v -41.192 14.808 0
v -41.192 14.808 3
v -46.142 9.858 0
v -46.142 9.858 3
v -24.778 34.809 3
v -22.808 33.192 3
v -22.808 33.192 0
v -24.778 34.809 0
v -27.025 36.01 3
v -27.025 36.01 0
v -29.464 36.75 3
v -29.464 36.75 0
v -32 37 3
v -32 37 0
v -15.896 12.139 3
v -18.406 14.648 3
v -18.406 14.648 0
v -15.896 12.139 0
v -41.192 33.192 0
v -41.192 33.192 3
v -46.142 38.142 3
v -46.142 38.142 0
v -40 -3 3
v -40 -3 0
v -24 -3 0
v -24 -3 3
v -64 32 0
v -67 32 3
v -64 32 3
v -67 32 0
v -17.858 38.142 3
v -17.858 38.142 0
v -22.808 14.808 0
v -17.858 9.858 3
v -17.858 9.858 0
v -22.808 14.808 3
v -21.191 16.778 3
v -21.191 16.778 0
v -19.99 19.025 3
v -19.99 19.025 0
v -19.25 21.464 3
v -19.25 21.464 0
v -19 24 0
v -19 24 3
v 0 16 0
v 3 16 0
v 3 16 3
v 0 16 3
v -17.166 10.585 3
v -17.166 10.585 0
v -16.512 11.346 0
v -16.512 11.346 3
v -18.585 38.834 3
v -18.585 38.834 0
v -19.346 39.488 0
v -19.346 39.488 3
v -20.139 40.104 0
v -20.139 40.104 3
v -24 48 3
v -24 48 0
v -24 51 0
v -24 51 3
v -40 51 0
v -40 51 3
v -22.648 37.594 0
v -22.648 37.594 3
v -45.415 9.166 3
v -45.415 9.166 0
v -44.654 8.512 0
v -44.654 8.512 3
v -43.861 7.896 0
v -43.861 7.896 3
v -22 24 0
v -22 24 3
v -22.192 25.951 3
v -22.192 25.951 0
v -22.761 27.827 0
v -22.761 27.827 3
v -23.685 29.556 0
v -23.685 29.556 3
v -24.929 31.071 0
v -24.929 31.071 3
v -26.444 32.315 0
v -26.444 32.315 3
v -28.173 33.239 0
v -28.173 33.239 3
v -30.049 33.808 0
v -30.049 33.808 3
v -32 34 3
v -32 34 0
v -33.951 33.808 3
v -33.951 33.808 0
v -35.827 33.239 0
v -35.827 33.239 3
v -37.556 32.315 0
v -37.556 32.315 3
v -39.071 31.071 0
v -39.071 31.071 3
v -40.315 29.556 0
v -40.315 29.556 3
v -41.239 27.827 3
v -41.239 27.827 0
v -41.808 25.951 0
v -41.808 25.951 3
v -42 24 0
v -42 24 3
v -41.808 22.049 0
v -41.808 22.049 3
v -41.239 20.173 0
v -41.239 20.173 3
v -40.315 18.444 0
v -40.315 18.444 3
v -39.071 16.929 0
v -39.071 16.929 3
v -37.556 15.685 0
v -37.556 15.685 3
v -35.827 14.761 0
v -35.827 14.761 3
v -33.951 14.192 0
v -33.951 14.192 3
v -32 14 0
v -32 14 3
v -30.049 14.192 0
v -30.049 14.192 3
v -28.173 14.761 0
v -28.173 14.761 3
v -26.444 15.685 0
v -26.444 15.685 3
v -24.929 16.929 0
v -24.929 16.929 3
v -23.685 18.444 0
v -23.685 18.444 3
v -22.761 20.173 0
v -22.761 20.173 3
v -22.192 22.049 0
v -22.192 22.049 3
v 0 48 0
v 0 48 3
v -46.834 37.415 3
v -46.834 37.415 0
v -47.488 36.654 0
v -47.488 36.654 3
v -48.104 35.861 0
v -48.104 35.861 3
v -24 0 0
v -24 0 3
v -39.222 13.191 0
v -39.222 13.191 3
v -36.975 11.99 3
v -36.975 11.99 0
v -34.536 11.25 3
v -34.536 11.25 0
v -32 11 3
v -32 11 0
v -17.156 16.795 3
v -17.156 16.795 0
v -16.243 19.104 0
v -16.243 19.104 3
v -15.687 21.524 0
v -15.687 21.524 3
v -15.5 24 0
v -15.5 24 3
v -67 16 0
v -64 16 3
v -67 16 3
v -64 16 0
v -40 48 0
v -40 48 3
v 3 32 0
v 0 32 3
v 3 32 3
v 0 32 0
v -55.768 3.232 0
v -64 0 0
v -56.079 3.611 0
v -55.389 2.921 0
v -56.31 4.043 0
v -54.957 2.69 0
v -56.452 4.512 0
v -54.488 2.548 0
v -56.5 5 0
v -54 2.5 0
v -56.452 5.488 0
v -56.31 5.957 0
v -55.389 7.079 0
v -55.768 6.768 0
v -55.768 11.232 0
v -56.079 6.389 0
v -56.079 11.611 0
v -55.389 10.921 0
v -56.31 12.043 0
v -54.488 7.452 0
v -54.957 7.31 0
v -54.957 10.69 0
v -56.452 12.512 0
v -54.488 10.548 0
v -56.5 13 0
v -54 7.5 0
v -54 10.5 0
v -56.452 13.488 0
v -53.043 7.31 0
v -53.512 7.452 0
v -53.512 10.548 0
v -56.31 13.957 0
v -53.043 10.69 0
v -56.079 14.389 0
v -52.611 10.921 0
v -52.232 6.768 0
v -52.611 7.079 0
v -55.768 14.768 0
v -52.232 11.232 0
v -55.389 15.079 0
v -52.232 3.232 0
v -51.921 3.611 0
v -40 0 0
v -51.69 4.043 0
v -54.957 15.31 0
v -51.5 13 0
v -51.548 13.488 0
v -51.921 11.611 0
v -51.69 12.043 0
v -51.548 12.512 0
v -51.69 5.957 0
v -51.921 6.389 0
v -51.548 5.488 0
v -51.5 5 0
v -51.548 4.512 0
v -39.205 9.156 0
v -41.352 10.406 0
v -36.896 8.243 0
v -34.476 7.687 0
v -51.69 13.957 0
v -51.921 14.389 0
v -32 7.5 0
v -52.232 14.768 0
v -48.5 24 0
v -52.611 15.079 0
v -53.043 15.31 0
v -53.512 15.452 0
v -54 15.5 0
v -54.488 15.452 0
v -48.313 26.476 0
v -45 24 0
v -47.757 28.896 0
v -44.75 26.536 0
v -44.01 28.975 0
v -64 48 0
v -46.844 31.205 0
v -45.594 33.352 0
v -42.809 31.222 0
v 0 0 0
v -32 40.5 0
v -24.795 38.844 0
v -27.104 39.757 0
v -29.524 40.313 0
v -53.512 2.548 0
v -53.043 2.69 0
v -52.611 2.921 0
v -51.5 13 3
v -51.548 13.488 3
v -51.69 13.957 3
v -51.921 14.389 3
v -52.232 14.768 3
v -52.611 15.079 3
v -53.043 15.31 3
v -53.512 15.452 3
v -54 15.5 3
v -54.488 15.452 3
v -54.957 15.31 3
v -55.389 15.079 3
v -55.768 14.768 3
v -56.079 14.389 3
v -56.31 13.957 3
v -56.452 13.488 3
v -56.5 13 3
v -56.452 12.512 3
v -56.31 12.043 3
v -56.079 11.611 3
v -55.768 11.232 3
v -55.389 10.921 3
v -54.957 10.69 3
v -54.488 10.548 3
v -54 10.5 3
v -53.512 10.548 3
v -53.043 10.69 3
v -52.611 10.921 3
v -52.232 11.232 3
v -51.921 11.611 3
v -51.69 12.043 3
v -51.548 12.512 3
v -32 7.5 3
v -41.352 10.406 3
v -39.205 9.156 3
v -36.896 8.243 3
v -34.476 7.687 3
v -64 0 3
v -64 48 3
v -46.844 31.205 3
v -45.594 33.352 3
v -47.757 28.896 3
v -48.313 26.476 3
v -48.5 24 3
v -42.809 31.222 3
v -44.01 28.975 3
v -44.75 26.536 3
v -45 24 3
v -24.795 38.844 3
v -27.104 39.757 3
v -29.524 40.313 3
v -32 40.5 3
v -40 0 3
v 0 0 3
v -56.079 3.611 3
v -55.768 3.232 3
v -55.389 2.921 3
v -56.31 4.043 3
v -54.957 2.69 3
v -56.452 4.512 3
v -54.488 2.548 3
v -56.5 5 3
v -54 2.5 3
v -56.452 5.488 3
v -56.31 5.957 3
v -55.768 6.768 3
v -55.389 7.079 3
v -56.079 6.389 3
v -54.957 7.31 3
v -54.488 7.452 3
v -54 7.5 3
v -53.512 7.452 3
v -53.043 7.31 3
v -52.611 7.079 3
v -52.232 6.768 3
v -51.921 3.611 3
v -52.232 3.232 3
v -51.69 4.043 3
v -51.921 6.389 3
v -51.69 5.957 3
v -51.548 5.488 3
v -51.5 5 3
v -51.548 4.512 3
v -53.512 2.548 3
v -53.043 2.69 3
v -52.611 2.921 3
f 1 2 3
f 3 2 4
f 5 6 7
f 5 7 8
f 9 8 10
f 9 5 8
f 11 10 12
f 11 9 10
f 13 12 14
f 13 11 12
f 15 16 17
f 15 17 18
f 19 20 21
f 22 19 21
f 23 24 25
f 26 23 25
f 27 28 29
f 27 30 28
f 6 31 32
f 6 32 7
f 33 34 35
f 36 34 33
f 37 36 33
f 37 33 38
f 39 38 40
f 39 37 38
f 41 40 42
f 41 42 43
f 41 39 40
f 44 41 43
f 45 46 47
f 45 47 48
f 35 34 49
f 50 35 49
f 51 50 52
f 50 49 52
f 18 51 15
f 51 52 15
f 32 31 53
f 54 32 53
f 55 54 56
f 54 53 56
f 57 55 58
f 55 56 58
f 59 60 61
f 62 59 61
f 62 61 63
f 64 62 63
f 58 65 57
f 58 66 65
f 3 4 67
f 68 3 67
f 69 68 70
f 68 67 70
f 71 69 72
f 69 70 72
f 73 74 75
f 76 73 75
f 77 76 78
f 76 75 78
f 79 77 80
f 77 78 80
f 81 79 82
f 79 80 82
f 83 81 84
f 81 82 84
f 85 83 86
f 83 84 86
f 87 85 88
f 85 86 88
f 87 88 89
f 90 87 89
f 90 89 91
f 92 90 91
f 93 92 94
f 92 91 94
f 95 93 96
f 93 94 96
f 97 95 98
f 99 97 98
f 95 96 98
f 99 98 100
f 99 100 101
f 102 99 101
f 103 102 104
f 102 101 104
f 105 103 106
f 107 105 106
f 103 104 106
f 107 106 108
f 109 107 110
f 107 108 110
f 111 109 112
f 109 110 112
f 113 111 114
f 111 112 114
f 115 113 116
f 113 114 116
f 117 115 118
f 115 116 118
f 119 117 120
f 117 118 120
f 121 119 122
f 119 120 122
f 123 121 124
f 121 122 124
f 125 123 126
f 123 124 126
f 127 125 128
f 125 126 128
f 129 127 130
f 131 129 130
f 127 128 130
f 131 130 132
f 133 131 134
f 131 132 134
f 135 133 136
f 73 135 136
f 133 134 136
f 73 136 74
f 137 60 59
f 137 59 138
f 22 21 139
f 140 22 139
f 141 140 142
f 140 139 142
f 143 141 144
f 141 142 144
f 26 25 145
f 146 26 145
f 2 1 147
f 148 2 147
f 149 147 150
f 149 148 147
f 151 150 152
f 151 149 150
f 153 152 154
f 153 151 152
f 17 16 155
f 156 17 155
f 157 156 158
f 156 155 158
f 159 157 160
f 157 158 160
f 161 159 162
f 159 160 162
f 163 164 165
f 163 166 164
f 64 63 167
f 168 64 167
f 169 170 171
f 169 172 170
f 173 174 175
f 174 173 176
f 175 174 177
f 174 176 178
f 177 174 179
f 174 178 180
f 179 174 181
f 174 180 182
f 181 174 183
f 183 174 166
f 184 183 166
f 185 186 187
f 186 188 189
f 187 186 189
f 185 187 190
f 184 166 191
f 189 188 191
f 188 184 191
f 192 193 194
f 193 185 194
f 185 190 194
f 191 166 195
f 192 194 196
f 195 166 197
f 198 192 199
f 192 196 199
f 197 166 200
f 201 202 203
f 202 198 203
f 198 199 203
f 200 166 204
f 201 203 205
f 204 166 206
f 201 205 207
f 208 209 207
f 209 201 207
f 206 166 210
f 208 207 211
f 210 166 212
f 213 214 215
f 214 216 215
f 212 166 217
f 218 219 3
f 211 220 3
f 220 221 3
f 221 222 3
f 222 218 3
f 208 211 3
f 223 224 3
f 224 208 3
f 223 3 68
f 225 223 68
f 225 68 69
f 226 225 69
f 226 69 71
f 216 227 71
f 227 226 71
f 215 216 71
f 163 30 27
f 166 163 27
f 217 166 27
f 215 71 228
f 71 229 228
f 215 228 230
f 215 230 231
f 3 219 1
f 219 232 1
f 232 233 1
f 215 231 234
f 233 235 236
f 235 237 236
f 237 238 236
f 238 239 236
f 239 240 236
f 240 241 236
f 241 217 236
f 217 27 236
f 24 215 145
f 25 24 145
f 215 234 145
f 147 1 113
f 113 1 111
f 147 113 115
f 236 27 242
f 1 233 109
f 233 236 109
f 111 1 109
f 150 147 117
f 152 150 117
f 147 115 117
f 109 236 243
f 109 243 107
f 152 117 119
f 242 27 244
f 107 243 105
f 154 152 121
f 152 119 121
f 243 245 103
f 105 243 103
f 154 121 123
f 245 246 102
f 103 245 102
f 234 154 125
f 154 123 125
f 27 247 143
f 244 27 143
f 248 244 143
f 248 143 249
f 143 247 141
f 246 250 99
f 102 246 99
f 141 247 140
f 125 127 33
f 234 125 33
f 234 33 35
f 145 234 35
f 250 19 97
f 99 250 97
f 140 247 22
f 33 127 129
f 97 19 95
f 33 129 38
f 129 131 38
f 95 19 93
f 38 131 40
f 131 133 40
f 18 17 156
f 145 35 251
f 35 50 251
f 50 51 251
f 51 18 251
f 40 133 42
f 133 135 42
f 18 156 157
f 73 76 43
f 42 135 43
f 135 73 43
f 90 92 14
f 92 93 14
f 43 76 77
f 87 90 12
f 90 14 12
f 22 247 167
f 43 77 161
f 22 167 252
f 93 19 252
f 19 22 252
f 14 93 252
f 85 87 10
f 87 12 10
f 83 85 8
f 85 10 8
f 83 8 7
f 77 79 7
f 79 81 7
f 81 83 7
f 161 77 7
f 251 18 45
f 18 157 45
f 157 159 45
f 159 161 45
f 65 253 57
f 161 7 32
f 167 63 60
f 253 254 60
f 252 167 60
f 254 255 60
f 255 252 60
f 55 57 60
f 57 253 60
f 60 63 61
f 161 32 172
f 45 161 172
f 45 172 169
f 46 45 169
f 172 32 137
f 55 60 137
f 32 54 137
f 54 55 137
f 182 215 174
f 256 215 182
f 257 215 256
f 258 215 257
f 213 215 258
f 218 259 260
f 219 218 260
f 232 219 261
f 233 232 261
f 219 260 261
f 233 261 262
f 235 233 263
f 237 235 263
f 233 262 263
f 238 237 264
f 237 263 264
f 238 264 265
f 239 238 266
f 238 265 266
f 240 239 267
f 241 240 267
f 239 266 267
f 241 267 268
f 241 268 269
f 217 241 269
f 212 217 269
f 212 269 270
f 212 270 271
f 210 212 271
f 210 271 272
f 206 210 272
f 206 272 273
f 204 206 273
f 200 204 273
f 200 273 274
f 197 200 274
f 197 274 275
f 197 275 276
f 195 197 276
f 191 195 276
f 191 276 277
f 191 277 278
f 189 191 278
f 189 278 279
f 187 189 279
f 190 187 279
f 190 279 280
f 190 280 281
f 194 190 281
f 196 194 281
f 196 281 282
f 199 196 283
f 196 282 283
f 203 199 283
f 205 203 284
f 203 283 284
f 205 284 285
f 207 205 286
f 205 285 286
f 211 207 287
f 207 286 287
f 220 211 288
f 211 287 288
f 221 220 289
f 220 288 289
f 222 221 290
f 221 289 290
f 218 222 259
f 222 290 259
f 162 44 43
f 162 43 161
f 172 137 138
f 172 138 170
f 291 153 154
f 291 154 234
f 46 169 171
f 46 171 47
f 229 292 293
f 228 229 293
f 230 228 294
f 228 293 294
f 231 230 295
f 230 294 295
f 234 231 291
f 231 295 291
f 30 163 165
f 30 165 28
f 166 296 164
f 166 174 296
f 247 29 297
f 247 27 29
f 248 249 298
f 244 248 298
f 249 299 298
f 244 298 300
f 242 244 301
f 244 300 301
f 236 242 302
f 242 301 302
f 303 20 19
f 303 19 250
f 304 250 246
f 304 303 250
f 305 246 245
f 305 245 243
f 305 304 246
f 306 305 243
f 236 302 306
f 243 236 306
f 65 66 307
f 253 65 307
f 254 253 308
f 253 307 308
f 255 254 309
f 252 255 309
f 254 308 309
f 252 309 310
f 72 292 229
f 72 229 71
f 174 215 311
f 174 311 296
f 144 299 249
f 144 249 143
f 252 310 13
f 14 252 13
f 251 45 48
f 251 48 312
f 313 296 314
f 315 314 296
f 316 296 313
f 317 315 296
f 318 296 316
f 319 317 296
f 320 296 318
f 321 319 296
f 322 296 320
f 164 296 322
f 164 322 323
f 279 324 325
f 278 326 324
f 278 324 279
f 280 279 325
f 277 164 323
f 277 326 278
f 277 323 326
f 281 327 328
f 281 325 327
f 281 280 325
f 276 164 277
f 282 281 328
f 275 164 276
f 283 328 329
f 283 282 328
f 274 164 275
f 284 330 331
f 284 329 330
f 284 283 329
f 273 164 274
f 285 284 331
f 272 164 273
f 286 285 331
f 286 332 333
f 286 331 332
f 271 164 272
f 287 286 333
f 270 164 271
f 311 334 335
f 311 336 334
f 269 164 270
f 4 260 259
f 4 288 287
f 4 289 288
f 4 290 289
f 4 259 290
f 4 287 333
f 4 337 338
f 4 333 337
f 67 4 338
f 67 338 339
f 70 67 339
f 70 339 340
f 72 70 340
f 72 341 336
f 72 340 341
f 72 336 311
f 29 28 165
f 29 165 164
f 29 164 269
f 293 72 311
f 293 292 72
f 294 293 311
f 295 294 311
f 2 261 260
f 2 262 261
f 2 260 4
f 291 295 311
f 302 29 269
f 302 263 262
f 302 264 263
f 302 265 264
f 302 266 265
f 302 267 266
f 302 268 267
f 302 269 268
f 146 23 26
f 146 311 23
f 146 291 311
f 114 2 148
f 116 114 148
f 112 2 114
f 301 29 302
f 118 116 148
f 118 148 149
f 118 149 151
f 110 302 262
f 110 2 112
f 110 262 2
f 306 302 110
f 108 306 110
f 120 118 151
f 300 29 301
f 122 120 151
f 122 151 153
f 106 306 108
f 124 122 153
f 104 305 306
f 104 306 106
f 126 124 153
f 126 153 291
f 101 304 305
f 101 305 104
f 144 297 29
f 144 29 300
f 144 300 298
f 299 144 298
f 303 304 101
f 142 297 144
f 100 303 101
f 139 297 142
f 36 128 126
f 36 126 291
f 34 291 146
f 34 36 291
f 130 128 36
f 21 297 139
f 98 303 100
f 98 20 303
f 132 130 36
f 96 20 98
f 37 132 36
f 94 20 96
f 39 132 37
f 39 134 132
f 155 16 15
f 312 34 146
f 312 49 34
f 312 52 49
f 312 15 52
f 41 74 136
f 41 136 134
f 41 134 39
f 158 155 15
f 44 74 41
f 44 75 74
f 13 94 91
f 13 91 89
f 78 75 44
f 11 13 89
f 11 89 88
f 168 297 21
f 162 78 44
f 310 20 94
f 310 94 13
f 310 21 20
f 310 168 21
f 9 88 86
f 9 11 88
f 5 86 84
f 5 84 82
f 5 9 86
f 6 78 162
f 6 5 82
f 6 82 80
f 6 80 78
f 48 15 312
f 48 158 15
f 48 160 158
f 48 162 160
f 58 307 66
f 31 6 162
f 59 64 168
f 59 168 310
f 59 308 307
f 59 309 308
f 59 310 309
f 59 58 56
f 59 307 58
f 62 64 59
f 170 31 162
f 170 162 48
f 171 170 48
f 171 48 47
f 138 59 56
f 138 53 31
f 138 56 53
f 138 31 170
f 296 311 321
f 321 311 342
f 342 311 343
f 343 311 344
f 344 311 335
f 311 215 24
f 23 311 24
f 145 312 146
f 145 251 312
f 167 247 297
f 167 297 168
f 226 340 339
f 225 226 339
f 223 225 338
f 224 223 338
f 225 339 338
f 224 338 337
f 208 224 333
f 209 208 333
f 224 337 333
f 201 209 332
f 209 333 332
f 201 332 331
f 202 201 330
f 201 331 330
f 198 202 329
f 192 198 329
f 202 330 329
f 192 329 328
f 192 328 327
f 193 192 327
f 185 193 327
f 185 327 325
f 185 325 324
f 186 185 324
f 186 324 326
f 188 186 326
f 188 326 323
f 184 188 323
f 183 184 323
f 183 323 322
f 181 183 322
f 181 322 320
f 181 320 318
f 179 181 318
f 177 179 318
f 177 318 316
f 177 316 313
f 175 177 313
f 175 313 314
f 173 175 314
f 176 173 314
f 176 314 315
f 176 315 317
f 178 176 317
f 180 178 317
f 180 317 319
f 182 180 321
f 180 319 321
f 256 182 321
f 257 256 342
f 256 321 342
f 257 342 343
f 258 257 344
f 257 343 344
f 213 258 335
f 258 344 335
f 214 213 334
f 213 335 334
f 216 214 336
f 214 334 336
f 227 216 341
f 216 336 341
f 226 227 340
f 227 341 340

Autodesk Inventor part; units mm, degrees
ref_plane "YZ Plane" through (0, 0, 0) normal (1, 0, 0) x (0, 1, 0)
ref_plane "XZ Plane" through (0, 0, 0) normal (0, 1, 0) x (-1, 0, 0)
ref_plane "XY Plane" through (0, 0, 0) normal (0, 0, 1) x (1, 0, 0)
sketch "Sketch1" plane through (0, 0, 0) normal (0, 0, 1) x (1, 0, 0)
  line L0 (-24, 48) -> (-24, 51)
  line L1 (-24, 51) -> (-40, 51)
  line L2 (-40, 51) -> (-40, 48)
  line L3 (0, 32) -> (3, 32)
  line L4 (3, 32) -> (3, 16)
  line L5 (3, 16) -> (0, 16)
  line L6 (-40, 0) -> (-40, -3)
  line L7 (-40, -3) -> (-24, -3)
  line L8 (-24, -3) -> (-24, 0)
  line L9 (-64, 16) -> (-67, 16)
  line L10 (-67, 16) -> (-67, 32)
  line L11 (-67, 32) -> (-64, 32)
  line L12 (-64, 48) -> (-40, 48)
  line L13 (-24, 48) -> (0, 48)
  line L14 (-64, 0) -> (-64, 16)
  line L15 (-64, 32) -> (-64, 48)
  line L16 (0, 0) -> (-24, 0)
  line L17 (-40, 0) -> (-64, 0)
  line L18 (0, 48) -> (0, 32)
  line L19 (0, 16) -> (0, 0)
  point P0 (0, 0)
  dimension "d3" = 16
  dimension "d4" = 16
  dimension "d8" = 64
  dimension "d9" = 48
  dimension "d10" = 3
  dimension "d11" = 3
  dimension "d12" = 24
  dimension "d13" = 24
  dimension "d14" = 16
  dimension "d15" = 3
extrude "Plate1" add sketch "Sketch1" along normal blind 3
sketch "Sketch2" plane through (0, 0, 3) normal (0, 0, 1) x (1, 0, 0)
  circle A0 centre (-32, 24) radius 10
  line L0 (-67, 32) -> (-67, 16) projected
  line L1 (-40, 51) -> (-24, 51) projected
  line L2 (0, 0) -> (0, 16) projected
  circle A1 centre (-32, 24) radius 16.5
  circle A2 centre (-32, 24) radius 20
  line L3 (0, 0) -> (-24, 0) projected
  line L4 (-64, 32) -> (-64, 48) projected
  line L5 (0, 48) -> (0, 32) projected
  line L6 (-64, 48) -> (-40, 48) projected
  line L7 (-64, 0) -> (-40, 0) projected
  line L8 (-52, 24) -> (-12, 24)
  line L9 (-32, 44) -> (-32, 4)
  line L10 (-17.8579, 38.1421) -> (-46.1421, 9.8579)
  line L11 (-17.8579, 9.8579) -> (-46.1421, 38.1421)
  line L12 (-22.6485, 37.5941) -> (-20.1392, 40.1035)
  line L13 (-18.4059, 14.6485) -> (-15.8965, 12.1392)
  line L14 (-41.3515, 10.4059) -> (-43.8608, 7.8965)
  line L15 (-45.5941, 33.3515) -> (-48.1035, 35.8608)
  circle A3 centre (-32, 24) radius 13
  circle A4 centre (-54, 5) radius 2.5
  circle A5 centre (-54, 13) radius 2.5
  line L16 (-64, 0) -> (-64, 16) projected
  point P0 (-32, 24)
  point P1 (-17.1512, 13.3939)
  point P2 (-32, 37)
  point P3 (-22.8076, 33.1924)
  point P4 (-32, 40.5)
  point P5 (-19, 24)
  point P6 (-22.8076, 14.8076)
  point P7 (-48.5, 24)
  point P8 (-32, 11)
  point P9 (-41.1924, 14.8076)
  point P10 (-32, 7.5)
  point P11 (-15.5, 24)
  point P12 (-45, 24)
  point P13 (-41.1924, 33.1924)
  point P14 (-43.6673, 35.6673)
  point P15 (-32, 24)
  point P16 (-20.3327, 12.3327)
  dimension "d17" = 20
  dimension "d21" = 3.5
  dimension "d24" = 24
  dimension "d25" = 32
  dimension "d26" = 45
  dimension "d27" = 3
  dimension "d28" = 3
  dimension "d29" = 3
  dimension "d30" = 3
  dimension "d31" = 3
  dimension "d34" = 5
  dimension "d35" = 5
  dimension "d36" = 5
  dimension "d37" = 10
  dimension "d38" = 8
  dimension "d39" = 3.5
extrude "Extrusion1" cut sketch "Sketch2" against normal through all contours L8 L10 A0 | A0 L11 L8 | L10 L9 A0 | A0 L9 L11 | L8 A1 L11 A3 | L10 A0 L8 | L11 A0 L9 | L9 A0 L10 | L8 A0 L11 | A3 L9 A1 L10 | A1 L12 A2 L10 | L9 A1 L10 A3 | A1 L13 A2 L11 | L8 A1 L11 A3 | A1 L14 A2 L10 | A1 L15 A2 L11 | A4 | A5
equation "\"d16\" = Thickness"
equation "\"BendRadius\" = Thickness"
equation "\"BendReliefWidth\" = Thickness"
equation "\"BendReliefDepth\" = 0.5 * Thickness"
equation "\"CornerReliefSize\" = 4 * Thickness"
equation "\"MinimumRemnant\" = 2 * Thickness"
equation "\"TransitionRadius\" = BendRadius"
equation "\"JacobiRadiusSize\" = BendRadius"
equation "\"GapSize\" = Thickness"
equation "\"Thickness\" = 3"
properties part number "back plate" material "Hardboard"
